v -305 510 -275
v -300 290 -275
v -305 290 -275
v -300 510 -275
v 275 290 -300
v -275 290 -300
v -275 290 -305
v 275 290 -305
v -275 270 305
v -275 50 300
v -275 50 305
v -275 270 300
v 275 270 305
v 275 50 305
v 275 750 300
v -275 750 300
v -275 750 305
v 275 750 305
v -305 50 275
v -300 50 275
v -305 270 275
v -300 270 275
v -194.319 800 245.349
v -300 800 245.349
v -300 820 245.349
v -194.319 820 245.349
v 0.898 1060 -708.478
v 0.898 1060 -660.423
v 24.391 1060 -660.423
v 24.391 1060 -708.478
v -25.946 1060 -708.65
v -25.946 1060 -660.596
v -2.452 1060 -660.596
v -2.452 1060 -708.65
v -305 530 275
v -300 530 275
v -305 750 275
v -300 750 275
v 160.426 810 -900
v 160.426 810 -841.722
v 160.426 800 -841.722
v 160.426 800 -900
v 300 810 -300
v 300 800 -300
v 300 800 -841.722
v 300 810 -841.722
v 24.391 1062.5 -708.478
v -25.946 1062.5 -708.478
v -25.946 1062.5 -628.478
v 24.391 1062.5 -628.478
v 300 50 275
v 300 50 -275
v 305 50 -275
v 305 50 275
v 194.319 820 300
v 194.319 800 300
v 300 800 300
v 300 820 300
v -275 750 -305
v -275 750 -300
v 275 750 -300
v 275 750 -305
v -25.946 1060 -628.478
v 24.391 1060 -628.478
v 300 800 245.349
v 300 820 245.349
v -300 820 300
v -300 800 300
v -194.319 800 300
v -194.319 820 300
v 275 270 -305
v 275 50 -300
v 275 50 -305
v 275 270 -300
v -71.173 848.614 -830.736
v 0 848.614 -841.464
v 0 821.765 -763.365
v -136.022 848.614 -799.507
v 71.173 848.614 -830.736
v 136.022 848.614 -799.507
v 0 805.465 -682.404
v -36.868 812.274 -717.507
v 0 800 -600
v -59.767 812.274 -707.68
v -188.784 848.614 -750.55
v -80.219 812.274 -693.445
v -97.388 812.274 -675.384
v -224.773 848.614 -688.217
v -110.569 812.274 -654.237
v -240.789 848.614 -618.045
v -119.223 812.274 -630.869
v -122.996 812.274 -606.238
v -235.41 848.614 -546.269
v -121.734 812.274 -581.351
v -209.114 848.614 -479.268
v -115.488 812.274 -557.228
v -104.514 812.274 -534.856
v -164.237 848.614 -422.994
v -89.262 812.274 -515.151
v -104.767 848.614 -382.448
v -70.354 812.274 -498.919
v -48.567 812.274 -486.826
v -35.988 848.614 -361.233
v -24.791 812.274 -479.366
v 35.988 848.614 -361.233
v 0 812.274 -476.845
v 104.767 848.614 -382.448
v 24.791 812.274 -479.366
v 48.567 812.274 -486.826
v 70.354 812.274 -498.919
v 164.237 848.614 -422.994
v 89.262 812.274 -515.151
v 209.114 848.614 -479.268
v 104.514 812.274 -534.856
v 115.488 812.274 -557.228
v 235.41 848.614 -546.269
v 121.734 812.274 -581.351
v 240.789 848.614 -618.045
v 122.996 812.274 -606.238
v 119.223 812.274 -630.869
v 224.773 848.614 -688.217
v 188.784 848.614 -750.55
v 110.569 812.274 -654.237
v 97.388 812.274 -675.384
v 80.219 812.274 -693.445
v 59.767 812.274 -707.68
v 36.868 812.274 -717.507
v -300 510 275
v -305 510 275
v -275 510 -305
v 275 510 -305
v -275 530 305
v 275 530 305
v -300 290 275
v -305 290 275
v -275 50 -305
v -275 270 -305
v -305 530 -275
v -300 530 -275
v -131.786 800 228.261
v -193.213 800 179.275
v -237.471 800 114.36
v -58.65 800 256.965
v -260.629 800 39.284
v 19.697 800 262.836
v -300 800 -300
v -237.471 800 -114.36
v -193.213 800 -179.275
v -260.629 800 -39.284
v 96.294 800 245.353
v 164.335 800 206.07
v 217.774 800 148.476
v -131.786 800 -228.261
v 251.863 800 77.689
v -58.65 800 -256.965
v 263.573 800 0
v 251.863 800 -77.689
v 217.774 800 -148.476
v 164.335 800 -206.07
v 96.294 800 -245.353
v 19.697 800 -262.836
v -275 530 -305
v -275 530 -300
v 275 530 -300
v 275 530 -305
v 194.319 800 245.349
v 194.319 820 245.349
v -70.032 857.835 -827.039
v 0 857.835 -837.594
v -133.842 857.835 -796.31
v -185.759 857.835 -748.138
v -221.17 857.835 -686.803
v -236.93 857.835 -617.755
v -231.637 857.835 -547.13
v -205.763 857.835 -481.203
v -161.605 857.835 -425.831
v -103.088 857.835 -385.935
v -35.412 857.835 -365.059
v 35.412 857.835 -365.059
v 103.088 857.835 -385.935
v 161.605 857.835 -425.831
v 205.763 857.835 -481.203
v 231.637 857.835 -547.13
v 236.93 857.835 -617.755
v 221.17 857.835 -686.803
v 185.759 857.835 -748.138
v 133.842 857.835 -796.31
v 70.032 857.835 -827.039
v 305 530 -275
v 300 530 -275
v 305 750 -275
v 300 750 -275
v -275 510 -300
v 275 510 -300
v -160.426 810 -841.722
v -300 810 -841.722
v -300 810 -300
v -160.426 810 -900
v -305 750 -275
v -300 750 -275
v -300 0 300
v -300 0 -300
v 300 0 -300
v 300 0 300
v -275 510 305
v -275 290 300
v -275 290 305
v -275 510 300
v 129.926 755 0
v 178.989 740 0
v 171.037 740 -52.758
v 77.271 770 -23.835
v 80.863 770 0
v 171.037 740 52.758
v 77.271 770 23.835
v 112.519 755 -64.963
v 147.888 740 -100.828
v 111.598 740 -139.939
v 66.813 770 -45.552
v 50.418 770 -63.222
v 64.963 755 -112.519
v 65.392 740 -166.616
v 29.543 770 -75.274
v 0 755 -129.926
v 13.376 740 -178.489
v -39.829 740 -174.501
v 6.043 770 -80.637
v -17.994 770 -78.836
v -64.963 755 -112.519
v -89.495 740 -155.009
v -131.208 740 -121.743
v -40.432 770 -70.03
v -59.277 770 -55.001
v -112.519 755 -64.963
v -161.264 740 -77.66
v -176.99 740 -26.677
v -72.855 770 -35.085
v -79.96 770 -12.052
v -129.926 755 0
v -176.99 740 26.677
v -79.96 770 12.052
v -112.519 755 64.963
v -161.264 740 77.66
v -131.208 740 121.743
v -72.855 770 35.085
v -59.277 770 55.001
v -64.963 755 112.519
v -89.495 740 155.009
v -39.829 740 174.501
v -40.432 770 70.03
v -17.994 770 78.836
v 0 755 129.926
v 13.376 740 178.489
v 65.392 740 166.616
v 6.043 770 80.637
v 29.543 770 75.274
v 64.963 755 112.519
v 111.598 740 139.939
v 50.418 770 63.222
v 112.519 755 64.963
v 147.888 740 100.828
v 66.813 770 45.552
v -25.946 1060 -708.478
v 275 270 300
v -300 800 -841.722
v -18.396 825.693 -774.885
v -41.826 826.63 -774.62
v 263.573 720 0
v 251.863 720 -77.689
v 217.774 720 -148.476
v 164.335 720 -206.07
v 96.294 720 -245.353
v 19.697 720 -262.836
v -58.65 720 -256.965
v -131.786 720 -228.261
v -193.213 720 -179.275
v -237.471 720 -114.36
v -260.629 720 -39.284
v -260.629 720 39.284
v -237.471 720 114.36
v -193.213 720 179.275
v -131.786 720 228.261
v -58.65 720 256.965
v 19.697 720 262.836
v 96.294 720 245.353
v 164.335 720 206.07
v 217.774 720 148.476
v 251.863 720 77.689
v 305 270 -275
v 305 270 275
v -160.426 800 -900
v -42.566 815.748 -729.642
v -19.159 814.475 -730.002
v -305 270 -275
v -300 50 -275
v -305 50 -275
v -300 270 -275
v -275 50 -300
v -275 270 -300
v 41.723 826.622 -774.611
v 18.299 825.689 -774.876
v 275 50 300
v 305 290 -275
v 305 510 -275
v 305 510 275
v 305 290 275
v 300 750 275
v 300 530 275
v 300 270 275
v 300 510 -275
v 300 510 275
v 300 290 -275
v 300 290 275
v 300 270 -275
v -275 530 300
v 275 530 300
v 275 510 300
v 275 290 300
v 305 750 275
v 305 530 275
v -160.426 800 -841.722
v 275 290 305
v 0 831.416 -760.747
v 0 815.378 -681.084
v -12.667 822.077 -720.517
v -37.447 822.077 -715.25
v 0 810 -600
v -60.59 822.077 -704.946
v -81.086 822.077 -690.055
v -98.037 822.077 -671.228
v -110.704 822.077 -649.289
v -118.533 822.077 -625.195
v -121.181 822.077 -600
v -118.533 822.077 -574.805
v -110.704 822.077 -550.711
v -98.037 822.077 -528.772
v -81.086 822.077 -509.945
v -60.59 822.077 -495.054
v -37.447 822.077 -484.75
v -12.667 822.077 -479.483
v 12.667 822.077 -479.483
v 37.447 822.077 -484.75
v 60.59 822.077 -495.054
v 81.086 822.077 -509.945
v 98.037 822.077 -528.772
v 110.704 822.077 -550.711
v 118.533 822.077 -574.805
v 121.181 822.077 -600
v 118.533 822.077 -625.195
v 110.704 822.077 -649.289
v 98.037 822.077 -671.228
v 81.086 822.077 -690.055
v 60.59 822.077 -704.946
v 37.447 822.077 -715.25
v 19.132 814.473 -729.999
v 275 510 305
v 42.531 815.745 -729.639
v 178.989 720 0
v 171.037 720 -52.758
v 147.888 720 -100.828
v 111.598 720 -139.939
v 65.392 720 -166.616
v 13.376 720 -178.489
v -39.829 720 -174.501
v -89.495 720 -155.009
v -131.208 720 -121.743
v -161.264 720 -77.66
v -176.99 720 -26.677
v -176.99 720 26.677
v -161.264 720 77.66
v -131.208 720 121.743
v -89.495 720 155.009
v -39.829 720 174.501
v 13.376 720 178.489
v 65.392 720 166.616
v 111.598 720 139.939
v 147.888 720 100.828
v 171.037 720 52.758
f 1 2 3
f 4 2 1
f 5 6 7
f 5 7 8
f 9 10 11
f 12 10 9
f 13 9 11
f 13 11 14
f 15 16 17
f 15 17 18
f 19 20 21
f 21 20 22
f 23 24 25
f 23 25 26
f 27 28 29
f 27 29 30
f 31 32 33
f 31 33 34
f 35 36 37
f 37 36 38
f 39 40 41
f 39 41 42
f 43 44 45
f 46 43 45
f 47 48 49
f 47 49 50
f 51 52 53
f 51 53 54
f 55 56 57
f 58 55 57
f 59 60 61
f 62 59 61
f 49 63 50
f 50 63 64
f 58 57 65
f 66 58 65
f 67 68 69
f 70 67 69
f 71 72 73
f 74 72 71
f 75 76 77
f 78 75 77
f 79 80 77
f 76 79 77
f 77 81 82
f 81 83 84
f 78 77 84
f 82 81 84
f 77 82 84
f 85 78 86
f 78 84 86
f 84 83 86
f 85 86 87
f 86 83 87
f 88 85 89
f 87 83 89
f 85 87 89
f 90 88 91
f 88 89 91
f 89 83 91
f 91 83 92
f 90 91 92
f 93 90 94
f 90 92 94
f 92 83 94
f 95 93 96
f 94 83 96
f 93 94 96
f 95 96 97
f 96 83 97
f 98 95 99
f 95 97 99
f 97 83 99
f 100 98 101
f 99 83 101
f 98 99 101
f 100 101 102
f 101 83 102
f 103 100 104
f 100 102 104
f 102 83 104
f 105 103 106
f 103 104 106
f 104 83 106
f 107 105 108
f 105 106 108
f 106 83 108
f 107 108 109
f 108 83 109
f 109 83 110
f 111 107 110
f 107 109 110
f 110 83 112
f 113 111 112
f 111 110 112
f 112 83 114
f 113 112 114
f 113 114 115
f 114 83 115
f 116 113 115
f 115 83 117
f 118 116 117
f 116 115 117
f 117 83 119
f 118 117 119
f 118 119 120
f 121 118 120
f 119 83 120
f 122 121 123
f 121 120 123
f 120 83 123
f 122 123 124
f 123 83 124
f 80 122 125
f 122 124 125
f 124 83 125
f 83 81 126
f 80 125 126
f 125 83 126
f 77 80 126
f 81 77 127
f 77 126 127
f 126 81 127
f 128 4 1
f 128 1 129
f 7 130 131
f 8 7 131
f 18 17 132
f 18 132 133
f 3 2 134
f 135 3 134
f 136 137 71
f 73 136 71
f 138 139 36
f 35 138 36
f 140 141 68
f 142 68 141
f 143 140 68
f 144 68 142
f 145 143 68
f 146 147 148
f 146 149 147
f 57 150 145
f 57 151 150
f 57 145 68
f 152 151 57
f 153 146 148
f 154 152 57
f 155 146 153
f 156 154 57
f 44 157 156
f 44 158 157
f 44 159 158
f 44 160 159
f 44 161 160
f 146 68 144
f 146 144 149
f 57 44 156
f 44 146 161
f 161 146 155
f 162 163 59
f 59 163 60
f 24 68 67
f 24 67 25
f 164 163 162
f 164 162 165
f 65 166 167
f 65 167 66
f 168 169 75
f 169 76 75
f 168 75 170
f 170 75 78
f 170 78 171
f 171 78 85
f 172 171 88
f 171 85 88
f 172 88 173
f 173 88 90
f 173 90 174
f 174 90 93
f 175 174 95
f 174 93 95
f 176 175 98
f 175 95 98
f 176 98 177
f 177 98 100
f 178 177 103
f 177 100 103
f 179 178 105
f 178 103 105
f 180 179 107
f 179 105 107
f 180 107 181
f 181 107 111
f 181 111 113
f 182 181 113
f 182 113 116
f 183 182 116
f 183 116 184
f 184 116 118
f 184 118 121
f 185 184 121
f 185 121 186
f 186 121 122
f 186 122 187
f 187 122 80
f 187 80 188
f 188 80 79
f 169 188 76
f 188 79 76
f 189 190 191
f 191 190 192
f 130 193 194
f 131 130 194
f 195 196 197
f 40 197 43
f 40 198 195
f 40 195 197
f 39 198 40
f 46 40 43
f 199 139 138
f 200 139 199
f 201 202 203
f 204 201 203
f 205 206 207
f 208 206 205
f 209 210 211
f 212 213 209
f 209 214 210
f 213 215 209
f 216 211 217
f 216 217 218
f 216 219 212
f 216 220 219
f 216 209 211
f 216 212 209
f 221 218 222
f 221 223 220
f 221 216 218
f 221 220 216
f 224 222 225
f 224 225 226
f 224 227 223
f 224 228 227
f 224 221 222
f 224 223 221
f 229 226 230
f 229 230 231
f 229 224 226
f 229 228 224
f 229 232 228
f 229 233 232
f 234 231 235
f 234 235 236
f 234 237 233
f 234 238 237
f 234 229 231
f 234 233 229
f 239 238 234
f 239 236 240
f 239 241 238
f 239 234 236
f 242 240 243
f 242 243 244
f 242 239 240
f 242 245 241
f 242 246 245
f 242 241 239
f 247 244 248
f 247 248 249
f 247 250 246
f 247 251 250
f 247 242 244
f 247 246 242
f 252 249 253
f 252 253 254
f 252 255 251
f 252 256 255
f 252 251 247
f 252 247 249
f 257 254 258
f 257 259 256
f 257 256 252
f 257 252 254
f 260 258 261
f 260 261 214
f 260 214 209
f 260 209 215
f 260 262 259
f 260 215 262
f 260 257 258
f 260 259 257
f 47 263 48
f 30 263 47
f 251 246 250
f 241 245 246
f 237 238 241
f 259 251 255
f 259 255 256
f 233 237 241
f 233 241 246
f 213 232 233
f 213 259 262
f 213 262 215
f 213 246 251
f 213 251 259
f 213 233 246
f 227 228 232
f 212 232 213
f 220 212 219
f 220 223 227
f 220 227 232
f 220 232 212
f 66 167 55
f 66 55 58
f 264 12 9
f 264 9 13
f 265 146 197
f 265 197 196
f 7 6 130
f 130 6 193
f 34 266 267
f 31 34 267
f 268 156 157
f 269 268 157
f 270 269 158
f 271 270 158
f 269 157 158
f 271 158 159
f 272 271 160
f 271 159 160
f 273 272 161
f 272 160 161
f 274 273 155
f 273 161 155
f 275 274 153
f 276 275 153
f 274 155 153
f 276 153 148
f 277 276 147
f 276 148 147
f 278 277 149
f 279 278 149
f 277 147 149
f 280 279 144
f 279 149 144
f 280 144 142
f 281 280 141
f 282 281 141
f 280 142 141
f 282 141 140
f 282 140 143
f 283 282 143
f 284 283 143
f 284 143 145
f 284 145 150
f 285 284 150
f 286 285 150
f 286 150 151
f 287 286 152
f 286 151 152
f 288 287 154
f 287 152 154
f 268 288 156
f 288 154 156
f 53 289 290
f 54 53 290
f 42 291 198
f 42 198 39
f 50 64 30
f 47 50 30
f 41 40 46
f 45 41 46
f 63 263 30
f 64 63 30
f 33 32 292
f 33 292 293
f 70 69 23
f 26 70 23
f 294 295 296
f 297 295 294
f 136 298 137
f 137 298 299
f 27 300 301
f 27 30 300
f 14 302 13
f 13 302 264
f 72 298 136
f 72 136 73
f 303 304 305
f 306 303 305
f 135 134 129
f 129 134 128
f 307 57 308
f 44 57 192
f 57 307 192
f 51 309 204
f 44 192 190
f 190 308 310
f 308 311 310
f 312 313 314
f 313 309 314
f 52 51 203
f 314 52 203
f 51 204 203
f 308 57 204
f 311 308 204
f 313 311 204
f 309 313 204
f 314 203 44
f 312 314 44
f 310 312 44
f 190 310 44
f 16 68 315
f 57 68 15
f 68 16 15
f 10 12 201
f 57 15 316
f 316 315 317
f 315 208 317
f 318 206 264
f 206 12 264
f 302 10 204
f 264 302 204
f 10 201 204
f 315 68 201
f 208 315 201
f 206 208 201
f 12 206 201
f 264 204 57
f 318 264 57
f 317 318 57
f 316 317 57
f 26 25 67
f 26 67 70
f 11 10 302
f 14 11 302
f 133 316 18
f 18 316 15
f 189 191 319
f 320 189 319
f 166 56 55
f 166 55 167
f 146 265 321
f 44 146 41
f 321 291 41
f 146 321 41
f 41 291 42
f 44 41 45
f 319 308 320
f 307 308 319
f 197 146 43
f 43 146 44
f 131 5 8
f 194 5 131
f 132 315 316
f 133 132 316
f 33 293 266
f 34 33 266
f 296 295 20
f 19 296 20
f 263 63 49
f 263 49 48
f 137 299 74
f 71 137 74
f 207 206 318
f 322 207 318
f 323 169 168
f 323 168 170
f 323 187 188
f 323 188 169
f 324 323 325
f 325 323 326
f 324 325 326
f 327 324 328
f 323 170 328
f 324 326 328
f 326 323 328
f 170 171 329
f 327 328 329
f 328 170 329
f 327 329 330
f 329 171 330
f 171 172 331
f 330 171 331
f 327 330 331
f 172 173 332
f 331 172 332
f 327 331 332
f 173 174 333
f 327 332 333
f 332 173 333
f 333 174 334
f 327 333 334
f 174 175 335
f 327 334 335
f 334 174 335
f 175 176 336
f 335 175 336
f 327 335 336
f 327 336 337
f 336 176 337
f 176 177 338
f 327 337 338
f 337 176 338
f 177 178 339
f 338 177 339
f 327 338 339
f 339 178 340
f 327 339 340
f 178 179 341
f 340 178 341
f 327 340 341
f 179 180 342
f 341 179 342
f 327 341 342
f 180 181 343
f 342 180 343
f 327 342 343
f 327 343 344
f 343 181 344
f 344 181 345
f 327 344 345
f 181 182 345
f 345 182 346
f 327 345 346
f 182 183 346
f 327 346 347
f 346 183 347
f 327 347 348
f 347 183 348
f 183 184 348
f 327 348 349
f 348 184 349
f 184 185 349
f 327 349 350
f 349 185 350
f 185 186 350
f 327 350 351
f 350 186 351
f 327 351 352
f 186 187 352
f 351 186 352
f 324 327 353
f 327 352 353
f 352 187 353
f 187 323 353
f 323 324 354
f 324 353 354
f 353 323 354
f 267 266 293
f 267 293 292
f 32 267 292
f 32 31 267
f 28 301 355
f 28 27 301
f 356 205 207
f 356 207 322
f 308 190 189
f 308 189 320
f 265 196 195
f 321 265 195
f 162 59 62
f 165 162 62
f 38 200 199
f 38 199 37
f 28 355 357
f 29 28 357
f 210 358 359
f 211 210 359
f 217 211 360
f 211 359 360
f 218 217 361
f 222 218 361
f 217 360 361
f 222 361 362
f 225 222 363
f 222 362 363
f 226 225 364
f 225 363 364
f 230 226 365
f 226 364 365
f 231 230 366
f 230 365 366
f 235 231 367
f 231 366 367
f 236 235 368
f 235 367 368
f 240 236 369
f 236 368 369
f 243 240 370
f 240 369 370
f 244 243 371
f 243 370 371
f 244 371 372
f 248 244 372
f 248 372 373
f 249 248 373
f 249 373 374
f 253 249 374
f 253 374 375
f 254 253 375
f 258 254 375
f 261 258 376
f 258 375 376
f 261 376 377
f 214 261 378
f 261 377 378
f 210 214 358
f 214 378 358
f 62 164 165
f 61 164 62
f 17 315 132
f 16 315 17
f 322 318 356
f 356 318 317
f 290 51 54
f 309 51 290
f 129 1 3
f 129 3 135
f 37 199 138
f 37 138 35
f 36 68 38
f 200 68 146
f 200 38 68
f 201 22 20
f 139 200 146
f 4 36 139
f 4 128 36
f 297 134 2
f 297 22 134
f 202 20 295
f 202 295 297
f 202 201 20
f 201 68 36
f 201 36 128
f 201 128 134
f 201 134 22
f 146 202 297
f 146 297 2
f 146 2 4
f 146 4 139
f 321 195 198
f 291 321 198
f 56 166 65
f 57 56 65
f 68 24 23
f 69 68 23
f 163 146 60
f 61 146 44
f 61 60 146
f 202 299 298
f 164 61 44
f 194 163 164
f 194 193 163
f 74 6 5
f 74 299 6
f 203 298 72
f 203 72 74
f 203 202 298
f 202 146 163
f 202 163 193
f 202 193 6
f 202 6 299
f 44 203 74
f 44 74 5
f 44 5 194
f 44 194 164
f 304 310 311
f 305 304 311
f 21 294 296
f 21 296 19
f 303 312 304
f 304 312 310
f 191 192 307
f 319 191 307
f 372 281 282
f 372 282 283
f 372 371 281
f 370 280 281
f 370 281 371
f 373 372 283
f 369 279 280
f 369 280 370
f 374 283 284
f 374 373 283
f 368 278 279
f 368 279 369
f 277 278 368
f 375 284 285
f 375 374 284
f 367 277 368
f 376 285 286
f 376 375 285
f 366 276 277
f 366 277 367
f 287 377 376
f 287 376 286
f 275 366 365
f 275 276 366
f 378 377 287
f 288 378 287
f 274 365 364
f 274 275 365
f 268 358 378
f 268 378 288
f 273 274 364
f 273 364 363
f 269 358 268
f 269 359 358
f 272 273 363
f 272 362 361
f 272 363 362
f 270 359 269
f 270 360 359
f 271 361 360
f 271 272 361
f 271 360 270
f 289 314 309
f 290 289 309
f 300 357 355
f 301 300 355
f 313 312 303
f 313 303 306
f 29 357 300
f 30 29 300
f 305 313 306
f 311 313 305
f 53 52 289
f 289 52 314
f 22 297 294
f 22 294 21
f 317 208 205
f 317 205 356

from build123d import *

# Parameters (mm, degrees)
SKETCH1_W               = 600
SKETCH1_H               = 600
BOSS_EXTRUDE1_DEPTH     = 800
SKETCH2_R               = 263.572920461
CUT_EXTRUDE2_DEPTH      = 80
SKETCH3_R               = 178.989072731
BOSS_EXTRUDE2_DEPTH     = 50
CHAMFER1_SIZE           = 30
CHAMFER1_SIZE2          = 98.125578555
SKETCH4_W               = 600
SKETCH4_H               = 600
BOSS_EXTRUDE3_DEPTH     = 10
SKETCH5_W               = 139.574184058
SKETCH5_H               = 58.278087479
CUT_EXTRUDE3_DEPTH      = 1
CUT_EXTRUDE3_DEPTH_BACK = 811
SKETCH8_W               = 23.493361295
SKETCH8_H               = 48.054602649
SKETCH9_W               = 23.493361295
SKETCH9_H               = 48.054602649
SKETCH8_7_W             = 23.493361295
SKETCH8_7_H             = 48.054602649
SKETCH9_4_W             = 23.493361295
SKETCH9_4_H             = 48.054602649
SKETCH11_W              = 50.336707402
SKETCH11_H              = 80
BOSS_EXTRUDE4_DEPTH     = 2.5
SKETCH12_W              = 550
SKETCH12_H              = 220
BOSS_EXTRUDE5_DEPTH     = 5
SKETCH13_W              = 550
SKETCH13_H              = 220
BOSS_EXTRUDE6_DEPTH     = 5
SKETCH14_W              = 105.681406042
SKETCH14_H              = 54.65067211
BOSS_EXTRUDE7_DEPTH     = 20
BOSS_EXTRUDE7_2_DEPTH   = 20


with BuildPart() as part:
    # Sketch1 → Boss-Extrude1 (new body)
    with BuildSketch(Plane(origin=(0, 0, 0), x_dir=(1, 0, 0), z_dir=(0, 1, 0))):
        Rectangle(SKETCH1_W, SKETCH1_H)
    extrude(amount=BOSS_EXTRUDE1_DEPTH)

    # Sketch2 → Cut-Extrude2 (cut)
    with BuildSketch(Plane(origin=(0, 800, 0), x_dir=(1, 0, 0), z_dir=(0, 1, 0))):
        Circle(SKETCH2_R)
    extrude(amount=-CUT_EXTRUDE2_DEPTH, mode=Mode.SUBTRACT)

    # Sketch3 → Boss-Extrude2 (add)
    with BuildSketch(Plane(origin=(0, 720, 0), x_dir=(1, 0, 0), z_dir=(0, 1, 0))):
        Circle(SKETCH3_R)
    extrude(amount=BOSS_EXTRUDE2_DEPTH)

    # Chamfer1
    chamfer1_edges = [part.edges().sort_by_distance(p)[0] for p in [
        (-178.989072731, 770, 0),
    ]]
    chamfer1_side = [part.faces().sort_by_distance(p)[0] for p in [
        (-178.989072731, 745, 0),
    ]]
    chamfer(chamfer1_edges, length=CHAMFER1_SIZE, length2=CHAMFER1_SIZE2, reference=chamfer1_side[0])

    # Sketch12 → Boss-Extrude5 (add)
    with BuildSketch(Plane.ZY.offset(300)):
        with Locations((0, 640)):
            Rectangle(SKETCH12_W, SKETCH12_H)
        with Locations((0, 400)):
            Rectangle(SKETCH12_W, SKETCH12_H)
        with Locations((0, 160)):
            Rectangle(SKETCH12_W, SKETCH12_H)
    boss_extrude5 = extrude(amount=BOSS_EXTRUDE5_DEPTH)

    # Mirror1: Boss-Extrude5 across plane
    add(boss_extrude5.mirror(Plane(origin=(0, 0, 0), x_dir=(0, 0, 1), z_dir=(1, 0, 0))))

    # Sketch13 → Boss-Extrude6 (add)
    with BuildSketch(Plane.XY.offset(300)):
        with Locations((0, 640)):
            Rectangle(SKETCH13_W, SKETCH13_H)
        with Locations((0, 400)):
            Rectangle(SKETCH13_W, SKETCH13_H)
        with Locations((0, 160)):
            Rectangle(SKETCH13_W, SKETCH13_H)
    boss_extrude6 = extrude(amount=BOSS_EXTRUDE6_DEPTH)

    # Mirror2: Boss-Extrude6 across plane
    add(boss_extrude6.mirror(Plane.XY))


with BuildPart() as body_2:
    # Sketch4 → Boss-Extrude3 (new body)
    with BuildSketch(Plane(origin=(0, 800, 0), x_dir=(1, 0, 0), z_dir=(0, 1, 0))):
        with Locations((0, 600)):
            Rectangle(SKETCH4_W, SKETCH4_H)
    extrude(amount=BOSS_EXTRUDE3_DEPTH)

    # Sketch5 → Cut-Extrude3 (cut, two sides)
    with BuildSketch(Plane(origin=(0, 810, 0), x_dir=(1, 0, 0), z_dir=(0, 1, 0))) as cut_extrude3_sk:
        with Locations((230.212907971, 870.86095626)):
            Rectangle(SKETCH5_W, SKETCH5_H)
        with Locations((-230.212907971, 870.86095626)):
            Rectangle(SKETCH5_W, SKETCH5_H)
    extrude(amount=CUT_EXTRUDE3_DEPTH, mode=Mode.SUBTRACT)
    extrude(cut_extrude3_sk.sketch, amount=-CUT_EXTRUDE3_DEPTH_BACK, mode=Mode.SUBTRACT)

    # Sketch8 → Loft2 section 0
    with BuildSketch(Plane(origin=(0, 810, 0), x_dir=(1, 0, 0), z_dir=(0, 1, 0))):
        with Locations((31.210643238, 755.294036312)):
            Rectangle(SKETCH8_W, SKETCH8_H)
    # Sketch9 → Loft2 section 1
    with BuildSketch(Plane(origin=(0, 1060, 0), x_dir=(1, 0, 0), z_dir=(0, 1, 0))):
        with Locations((12.644197915, 684.450320998)):
            Rectangle(SKETCH9_W, SKETCH9_H)
    loft()

    # Sketch8<7> → Loft3 section 0
    with BuildSketch(Plane(origin=(0, 810, 0), x_dir=(1, 0, 0), z_dir=(0, 1, 0))):
        with Locations((-31.210643238, 755.294036312)):
            Rectangle(SKETCH8_7_W, SKETCH8_7_H)
    # Sketch9<4> → Loft3 section 1
    with BuildSketch(Plane(origin=(0, 1060, 0), x_dir=(1, 0, 0), z_dir=(0, 1, 0))):
        with Locations((-14.199148193, 684.622952273)):
            Rectangle(SKETCH9_4_W, SKETCH9_4_H)
    loft()

    # Sketch10 → Cut-Revolve1 (revolve, cut)
    with BuildSketch(Plane(origin=(0, 0, 0), x_dir=(0, 0, -1), z_dir=(1, 0, 0))):
        Polygon((720.934851244, 810), (787.561546381, 810), (784.086687345, 827.772629133), (720.934851244, 811.831453048), align=None)
    revolve(axis=Axis((0, 533.301130193, -600), (0, 1, 0)), mode=Mode.SUBTRACT)


with BuildPart() as body_3:
    # Sketch7 → Revolve-Thin1 (revolve)
    with BuildSketch(Plane(origin=(0, 0, 0), x_dir=(0, 0, -1), z_dir=(1, 0, 0))):
        with BuildLine():
            ThreePointArc((600, 810), (721.180877874, 822.077451842), (837.594329941, 857.834663464))
            Line((837.594329941, 857.834663464), (841.464059464, 848.613752803))
            ThreePointArc((841.464059464, 848.613752803), (723.154566475, 812.27415886), (600, 800))
            Line((600, 800), (600, 810))
        make_face()
    revolve(axis=Axis((0, 533.301130193, -600), (0, 1, 0)))


with BuildPart() as body_4:
    # Sketch11 → Boss-Extrude4 (new body)
    with BuildSketch(Plane(origin=(0, 1060, 0), x_dir=(1, 0, 0), z_dir=(0, 1, 0))):
        with Locations((-0.777475139, 668.477622322)):
            Rectangle(SKETCH11_W, SKETCH11_H)
    extrude(amount=BOSS_EXTRUDE4_DEPTH)


with BuildPart() as body_5:
    # Sketch14 → Boss-Extrude7 (new body)
    with BuildSketch(Plane(origin=(0, 800, 0), x_dir=(1, 0, 0), z_dir=(0, 1, 0))):
        with Locations((247.159296979, -272.674663945)):
            Rectangle(SKETCH14_W, SKETCH14_H)
    extrude(amount=BOSS_EXTRUDE7_DEPTH)


with BuildPart() as body_6:
    # Sketch14 → Boss-Extrude7 2 (new body)
    with BuildSketch(Plane(origin=(0, 800, 0), x_dir=(1, 0, 0), z_dir=(0, 1, 0))):
        with Locations((-247.159296979, -272.674663945)):
            Rectangle(SKETCH14_W, SKETCH14_H)
    extrude(amount=BOSS_EXTRUDE7_2_DEPTH)


solid = Compound([part.part, body_2.part, body_3.part, body_4.part, body_5.part, body_6.part])
